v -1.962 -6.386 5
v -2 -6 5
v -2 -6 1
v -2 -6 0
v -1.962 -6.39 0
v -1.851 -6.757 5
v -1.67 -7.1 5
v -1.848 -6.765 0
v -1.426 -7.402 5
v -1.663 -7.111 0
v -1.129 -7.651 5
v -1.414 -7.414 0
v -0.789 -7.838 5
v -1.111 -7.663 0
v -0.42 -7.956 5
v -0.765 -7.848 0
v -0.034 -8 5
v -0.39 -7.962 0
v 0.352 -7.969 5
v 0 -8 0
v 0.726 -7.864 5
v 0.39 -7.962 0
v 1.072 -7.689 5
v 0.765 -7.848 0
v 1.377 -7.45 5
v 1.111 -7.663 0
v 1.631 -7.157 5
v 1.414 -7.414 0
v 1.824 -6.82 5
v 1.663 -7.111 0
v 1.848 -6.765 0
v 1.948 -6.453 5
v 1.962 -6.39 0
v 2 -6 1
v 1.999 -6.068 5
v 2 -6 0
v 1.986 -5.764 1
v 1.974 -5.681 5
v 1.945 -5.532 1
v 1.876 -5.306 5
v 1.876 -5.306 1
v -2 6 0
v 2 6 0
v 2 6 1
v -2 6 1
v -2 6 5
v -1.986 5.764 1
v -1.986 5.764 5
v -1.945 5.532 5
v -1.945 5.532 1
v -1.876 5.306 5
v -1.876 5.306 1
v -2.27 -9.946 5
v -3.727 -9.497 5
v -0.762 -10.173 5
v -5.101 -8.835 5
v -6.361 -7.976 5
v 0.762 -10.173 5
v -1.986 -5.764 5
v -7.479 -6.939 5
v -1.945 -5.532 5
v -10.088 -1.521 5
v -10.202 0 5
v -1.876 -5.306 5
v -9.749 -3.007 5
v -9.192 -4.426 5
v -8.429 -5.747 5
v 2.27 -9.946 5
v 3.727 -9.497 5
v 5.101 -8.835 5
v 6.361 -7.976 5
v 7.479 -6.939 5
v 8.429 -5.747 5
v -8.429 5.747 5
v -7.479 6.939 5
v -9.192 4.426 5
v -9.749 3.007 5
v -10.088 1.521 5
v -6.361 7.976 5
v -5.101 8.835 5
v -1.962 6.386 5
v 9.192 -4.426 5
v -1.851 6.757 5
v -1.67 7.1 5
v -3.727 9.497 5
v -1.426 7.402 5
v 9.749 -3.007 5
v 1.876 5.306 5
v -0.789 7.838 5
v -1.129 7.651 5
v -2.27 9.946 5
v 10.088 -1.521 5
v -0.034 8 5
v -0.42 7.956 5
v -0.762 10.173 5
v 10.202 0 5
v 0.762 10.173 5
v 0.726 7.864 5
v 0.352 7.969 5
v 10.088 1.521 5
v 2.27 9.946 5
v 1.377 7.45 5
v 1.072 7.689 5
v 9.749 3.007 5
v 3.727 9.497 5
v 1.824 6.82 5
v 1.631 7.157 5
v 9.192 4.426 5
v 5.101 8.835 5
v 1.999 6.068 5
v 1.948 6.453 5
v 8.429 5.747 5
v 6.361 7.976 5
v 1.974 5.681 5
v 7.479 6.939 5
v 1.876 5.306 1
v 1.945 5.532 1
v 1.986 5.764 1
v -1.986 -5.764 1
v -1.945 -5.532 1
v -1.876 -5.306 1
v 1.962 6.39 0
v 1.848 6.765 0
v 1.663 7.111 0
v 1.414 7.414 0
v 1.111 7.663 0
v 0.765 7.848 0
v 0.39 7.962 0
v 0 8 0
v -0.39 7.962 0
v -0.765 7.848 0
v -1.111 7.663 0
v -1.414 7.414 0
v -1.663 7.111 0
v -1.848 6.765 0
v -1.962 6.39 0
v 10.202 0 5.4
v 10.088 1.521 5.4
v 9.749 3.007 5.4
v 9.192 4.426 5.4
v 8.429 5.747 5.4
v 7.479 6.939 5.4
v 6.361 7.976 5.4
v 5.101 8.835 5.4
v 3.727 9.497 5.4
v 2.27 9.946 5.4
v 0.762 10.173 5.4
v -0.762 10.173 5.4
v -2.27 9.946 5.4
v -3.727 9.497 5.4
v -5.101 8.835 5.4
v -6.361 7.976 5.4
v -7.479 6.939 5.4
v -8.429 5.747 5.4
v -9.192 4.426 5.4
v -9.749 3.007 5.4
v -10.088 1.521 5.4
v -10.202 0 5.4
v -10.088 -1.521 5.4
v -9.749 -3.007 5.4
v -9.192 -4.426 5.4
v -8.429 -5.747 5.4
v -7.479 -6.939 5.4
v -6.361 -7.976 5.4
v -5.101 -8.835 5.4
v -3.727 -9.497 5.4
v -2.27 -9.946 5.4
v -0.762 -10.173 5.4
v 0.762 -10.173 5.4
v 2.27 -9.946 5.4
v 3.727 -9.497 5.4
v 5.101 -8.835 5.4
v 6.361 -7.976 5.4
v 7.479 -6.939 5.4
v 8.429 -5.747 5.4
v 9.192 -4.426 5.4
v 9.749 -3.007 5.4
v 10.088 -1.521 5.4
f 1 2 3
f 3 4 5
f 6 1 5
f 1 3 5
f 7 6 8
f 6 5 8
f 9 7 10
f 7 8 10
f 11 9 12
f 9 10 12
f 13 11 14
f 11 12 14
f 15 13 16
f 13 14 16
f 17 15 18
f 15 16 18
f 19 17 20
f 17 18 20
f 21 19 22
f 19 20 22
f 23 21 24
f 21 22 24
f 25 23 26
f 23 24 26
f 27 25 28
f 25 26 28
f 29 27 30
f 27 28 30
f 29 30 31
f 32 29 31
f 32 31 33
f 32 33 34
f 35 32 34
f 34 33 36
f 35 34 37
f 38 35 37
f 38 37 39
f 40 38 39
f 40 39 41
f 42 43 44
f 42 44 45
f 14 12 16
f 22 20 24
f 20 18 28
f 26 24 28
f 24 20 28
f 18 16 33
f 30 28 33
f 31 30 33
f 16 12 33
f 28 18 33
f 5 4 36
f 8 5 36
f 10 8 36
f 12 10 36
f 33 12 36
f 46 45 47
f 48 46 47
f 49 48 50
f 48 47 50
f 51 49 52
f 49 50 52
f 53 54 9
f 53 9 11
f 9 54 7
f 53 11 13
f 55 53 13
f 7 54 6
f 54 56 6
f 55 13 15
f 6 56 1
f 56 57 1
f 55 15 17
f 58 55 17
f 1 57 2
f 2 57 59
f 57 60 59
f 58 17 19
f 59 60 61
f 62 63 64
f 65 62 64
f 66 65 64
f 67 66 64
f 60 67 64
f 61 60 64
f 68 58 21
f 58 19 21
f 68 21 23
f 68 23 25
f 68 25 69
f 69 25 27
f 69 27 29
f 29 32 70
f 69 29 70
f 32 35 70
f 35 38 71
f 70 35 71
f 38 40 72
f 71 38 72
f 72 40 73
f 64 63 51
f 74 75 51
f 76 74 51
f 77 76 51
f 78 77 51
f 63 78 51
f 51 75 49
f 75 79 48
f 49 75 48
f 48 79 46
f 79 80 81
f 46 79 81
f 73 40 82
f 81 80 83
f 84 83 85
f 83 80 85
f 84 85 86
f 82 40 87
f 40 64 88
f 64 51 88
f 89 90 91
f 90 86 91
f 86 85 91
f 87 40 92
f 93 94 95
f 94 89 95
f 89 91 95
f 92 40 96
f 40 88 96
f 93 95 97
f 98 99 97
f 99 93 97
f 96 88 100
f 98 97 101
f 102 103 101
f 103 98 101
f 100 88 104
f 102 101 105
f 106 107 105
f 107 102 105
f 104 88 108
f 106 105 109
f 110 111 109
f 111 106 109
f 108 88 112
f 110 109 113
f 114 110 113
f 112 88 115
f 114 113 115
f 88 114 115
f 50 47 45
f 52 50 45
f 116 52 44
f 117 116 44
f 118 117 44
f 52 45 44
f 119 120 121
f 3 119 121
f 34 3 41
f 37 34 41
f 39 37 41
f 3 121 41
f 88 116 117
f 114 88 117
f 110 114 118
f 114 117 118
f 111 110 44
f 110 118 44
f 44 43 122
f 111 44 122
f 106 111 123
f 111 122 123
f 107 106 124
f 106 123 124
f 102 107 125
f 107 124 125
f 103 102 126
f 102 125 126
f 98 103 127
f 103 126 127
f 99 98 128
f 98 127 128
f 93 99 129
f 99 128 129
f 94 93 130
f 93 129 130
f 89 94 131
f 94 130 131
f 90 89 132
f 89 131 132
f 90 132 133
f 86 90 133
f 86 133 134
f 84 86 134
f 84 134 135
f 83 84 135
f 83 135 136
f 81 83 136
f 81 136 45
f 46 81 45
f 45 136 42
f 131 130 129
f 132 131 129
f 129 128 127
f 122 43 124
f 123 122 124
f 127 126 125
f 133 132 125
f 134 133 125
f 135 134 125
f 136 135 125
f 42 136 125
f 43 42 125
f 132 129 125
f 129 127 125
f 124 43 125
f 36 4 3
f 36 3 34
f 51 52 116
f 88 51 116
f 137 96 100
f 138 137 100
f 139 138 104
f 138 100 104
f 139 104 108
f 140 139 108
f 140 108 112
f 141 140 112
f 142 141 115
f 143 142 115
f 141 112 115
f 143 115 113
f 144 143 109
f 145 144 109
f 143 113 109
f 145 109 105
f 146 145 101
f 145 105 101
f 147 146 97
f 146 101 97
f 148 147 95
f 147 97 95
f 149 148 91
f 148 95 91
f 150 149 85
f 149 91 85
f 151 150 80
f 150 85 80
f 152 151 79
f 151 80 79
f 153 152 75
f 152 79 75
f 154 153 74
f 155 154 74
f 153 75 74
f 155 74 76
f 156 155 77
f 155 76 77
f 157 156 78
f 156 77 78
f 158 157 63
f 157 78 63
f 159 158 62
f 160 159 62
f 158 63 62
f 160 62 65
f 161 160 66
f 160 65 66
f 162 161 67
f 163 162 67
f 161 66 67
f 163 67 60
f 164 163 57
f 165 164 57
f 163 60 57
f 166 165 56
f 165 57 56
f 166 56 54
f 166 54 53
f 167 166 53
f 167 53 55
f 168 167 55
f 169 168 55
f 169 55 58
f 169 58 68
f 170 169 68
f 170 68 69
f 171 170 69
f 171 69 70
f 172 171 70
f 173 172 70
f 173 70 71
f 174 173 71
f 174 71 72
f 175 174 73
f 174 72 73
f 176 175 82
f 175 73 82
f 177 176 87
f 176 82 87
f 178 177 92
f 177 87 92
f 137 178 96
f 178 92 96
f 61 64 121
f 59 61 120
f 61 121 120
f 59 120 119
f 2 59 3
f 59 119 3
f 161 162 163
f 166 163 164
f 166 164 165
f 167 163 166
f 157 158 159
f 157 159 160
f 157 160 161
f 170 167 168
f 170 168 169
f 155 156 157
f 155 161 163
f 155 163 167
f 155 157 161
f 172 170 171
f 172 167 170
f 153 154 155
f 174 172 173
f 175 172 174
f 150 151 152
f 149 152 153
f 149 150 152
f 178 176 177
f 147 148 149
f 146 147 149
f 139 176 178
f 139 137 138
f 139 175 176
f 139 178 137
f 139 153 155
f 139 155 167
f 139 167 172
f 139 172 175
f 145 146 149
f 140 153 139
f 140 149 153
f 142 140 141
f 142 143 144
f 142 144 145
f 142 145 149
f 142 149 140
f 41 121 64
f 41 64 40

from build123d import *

# Parameters (mm, degrees)
F1_DEPTH = 5
F2_DEPTH = 1
F3_W     = 7.4393213727
F3_H     = 10.612742044
F4_DEPTH = 25
F5_R     = 10.2019510015
F6_DEPTH = 0.4


with BuildPart() as f1:
    # F0 (on Top) → F1 (new body)
    with BuildSketch(Plane.XY):
        with BuildLine():
            Line((-2, 6), (2, 6))
            ThreePointArc((2, 6), (0, 8), (-2, 6))
        make_face()
        with BuildLine():
            ThreePointArc((-2, 6), (0, 4), (2, 6))
            Line((2, 6), (-2, 6))
        make_face()
    extrude(amount=F1_DEPTH)


with BuildPart() as f1b:
    # F0 (on Top) → F1, piece 2 (new body)
    with BuildSketch(Plane.XY):
        with BuildLine():
            Line((-2, -6), (2, -6))
            ThreePointArc((2, -6), (0, -4), (-2, -6))
        make_face()
        with BuildLine():
            ThreePointArc((-2, -6), (0, -8), (2, -6))
            Line((2, -6), (-2, -6))
        make_face()
    extrude(amount=F1_DEPTH)


with BuildPart() as f2_tool:
    # F0 (on Top) → F2 (new body)
    with BuildSketch(Plane.XY):
        with BuildLine():
            ThreePointArc((-2, 6), (0, 4), (2, 6))
            Line((2, 6), (-2, 6))
        make_face()
        with BuildLine():
            Line((-2, -6), (2, -6))
            ThreePointArc((2, -6), (0, -4), (-2, -6))
        make_face()
    extrude(amount=F2_DEPTH)


with BuildPart() as f1_1:
    add(f1.part)

    # F2: cut by f2_tool
    add(f2_tool.part, mode=Mode.SUBTRACT)


with BuildPart() as f1b_1:
    add(f1b.part)

    # F2: cut by f2_tool
    add(f2_tool.part, mode=Mode.SUBTRACT)


with BuildPart() as f4_tool:
    # F3 (on face) → F4 (new body)
    with BuildSketch(Plane.XY):
        Rectangle(F3_W, F3_H)
    extrude(amount=F4_DEPTH)


with BuildPart() as f1_2:
    add(f1_1.part)

    # F4: cut by f4_tool
    add(f4_tool.part, mode=Mode.SUBTRACT)



with BuildPart() as f1b_2:
    add(f1b_1.part)

    # F4: cut by f4_tool
    add(f4_tool.part, mode=Mode.SUBTRACT)


with BuildPart() as f1_3:
    add(f1_2.part)

    add(f1b_2.part)  # F6 merges F1b
    # F5 (on face) → F6 (join)
    with BuildSketch(Plane.XY.offset(5)):
        Circle(F5_R)
    extrude(amount=F6_DEPTH)


solid = f1_3.part
